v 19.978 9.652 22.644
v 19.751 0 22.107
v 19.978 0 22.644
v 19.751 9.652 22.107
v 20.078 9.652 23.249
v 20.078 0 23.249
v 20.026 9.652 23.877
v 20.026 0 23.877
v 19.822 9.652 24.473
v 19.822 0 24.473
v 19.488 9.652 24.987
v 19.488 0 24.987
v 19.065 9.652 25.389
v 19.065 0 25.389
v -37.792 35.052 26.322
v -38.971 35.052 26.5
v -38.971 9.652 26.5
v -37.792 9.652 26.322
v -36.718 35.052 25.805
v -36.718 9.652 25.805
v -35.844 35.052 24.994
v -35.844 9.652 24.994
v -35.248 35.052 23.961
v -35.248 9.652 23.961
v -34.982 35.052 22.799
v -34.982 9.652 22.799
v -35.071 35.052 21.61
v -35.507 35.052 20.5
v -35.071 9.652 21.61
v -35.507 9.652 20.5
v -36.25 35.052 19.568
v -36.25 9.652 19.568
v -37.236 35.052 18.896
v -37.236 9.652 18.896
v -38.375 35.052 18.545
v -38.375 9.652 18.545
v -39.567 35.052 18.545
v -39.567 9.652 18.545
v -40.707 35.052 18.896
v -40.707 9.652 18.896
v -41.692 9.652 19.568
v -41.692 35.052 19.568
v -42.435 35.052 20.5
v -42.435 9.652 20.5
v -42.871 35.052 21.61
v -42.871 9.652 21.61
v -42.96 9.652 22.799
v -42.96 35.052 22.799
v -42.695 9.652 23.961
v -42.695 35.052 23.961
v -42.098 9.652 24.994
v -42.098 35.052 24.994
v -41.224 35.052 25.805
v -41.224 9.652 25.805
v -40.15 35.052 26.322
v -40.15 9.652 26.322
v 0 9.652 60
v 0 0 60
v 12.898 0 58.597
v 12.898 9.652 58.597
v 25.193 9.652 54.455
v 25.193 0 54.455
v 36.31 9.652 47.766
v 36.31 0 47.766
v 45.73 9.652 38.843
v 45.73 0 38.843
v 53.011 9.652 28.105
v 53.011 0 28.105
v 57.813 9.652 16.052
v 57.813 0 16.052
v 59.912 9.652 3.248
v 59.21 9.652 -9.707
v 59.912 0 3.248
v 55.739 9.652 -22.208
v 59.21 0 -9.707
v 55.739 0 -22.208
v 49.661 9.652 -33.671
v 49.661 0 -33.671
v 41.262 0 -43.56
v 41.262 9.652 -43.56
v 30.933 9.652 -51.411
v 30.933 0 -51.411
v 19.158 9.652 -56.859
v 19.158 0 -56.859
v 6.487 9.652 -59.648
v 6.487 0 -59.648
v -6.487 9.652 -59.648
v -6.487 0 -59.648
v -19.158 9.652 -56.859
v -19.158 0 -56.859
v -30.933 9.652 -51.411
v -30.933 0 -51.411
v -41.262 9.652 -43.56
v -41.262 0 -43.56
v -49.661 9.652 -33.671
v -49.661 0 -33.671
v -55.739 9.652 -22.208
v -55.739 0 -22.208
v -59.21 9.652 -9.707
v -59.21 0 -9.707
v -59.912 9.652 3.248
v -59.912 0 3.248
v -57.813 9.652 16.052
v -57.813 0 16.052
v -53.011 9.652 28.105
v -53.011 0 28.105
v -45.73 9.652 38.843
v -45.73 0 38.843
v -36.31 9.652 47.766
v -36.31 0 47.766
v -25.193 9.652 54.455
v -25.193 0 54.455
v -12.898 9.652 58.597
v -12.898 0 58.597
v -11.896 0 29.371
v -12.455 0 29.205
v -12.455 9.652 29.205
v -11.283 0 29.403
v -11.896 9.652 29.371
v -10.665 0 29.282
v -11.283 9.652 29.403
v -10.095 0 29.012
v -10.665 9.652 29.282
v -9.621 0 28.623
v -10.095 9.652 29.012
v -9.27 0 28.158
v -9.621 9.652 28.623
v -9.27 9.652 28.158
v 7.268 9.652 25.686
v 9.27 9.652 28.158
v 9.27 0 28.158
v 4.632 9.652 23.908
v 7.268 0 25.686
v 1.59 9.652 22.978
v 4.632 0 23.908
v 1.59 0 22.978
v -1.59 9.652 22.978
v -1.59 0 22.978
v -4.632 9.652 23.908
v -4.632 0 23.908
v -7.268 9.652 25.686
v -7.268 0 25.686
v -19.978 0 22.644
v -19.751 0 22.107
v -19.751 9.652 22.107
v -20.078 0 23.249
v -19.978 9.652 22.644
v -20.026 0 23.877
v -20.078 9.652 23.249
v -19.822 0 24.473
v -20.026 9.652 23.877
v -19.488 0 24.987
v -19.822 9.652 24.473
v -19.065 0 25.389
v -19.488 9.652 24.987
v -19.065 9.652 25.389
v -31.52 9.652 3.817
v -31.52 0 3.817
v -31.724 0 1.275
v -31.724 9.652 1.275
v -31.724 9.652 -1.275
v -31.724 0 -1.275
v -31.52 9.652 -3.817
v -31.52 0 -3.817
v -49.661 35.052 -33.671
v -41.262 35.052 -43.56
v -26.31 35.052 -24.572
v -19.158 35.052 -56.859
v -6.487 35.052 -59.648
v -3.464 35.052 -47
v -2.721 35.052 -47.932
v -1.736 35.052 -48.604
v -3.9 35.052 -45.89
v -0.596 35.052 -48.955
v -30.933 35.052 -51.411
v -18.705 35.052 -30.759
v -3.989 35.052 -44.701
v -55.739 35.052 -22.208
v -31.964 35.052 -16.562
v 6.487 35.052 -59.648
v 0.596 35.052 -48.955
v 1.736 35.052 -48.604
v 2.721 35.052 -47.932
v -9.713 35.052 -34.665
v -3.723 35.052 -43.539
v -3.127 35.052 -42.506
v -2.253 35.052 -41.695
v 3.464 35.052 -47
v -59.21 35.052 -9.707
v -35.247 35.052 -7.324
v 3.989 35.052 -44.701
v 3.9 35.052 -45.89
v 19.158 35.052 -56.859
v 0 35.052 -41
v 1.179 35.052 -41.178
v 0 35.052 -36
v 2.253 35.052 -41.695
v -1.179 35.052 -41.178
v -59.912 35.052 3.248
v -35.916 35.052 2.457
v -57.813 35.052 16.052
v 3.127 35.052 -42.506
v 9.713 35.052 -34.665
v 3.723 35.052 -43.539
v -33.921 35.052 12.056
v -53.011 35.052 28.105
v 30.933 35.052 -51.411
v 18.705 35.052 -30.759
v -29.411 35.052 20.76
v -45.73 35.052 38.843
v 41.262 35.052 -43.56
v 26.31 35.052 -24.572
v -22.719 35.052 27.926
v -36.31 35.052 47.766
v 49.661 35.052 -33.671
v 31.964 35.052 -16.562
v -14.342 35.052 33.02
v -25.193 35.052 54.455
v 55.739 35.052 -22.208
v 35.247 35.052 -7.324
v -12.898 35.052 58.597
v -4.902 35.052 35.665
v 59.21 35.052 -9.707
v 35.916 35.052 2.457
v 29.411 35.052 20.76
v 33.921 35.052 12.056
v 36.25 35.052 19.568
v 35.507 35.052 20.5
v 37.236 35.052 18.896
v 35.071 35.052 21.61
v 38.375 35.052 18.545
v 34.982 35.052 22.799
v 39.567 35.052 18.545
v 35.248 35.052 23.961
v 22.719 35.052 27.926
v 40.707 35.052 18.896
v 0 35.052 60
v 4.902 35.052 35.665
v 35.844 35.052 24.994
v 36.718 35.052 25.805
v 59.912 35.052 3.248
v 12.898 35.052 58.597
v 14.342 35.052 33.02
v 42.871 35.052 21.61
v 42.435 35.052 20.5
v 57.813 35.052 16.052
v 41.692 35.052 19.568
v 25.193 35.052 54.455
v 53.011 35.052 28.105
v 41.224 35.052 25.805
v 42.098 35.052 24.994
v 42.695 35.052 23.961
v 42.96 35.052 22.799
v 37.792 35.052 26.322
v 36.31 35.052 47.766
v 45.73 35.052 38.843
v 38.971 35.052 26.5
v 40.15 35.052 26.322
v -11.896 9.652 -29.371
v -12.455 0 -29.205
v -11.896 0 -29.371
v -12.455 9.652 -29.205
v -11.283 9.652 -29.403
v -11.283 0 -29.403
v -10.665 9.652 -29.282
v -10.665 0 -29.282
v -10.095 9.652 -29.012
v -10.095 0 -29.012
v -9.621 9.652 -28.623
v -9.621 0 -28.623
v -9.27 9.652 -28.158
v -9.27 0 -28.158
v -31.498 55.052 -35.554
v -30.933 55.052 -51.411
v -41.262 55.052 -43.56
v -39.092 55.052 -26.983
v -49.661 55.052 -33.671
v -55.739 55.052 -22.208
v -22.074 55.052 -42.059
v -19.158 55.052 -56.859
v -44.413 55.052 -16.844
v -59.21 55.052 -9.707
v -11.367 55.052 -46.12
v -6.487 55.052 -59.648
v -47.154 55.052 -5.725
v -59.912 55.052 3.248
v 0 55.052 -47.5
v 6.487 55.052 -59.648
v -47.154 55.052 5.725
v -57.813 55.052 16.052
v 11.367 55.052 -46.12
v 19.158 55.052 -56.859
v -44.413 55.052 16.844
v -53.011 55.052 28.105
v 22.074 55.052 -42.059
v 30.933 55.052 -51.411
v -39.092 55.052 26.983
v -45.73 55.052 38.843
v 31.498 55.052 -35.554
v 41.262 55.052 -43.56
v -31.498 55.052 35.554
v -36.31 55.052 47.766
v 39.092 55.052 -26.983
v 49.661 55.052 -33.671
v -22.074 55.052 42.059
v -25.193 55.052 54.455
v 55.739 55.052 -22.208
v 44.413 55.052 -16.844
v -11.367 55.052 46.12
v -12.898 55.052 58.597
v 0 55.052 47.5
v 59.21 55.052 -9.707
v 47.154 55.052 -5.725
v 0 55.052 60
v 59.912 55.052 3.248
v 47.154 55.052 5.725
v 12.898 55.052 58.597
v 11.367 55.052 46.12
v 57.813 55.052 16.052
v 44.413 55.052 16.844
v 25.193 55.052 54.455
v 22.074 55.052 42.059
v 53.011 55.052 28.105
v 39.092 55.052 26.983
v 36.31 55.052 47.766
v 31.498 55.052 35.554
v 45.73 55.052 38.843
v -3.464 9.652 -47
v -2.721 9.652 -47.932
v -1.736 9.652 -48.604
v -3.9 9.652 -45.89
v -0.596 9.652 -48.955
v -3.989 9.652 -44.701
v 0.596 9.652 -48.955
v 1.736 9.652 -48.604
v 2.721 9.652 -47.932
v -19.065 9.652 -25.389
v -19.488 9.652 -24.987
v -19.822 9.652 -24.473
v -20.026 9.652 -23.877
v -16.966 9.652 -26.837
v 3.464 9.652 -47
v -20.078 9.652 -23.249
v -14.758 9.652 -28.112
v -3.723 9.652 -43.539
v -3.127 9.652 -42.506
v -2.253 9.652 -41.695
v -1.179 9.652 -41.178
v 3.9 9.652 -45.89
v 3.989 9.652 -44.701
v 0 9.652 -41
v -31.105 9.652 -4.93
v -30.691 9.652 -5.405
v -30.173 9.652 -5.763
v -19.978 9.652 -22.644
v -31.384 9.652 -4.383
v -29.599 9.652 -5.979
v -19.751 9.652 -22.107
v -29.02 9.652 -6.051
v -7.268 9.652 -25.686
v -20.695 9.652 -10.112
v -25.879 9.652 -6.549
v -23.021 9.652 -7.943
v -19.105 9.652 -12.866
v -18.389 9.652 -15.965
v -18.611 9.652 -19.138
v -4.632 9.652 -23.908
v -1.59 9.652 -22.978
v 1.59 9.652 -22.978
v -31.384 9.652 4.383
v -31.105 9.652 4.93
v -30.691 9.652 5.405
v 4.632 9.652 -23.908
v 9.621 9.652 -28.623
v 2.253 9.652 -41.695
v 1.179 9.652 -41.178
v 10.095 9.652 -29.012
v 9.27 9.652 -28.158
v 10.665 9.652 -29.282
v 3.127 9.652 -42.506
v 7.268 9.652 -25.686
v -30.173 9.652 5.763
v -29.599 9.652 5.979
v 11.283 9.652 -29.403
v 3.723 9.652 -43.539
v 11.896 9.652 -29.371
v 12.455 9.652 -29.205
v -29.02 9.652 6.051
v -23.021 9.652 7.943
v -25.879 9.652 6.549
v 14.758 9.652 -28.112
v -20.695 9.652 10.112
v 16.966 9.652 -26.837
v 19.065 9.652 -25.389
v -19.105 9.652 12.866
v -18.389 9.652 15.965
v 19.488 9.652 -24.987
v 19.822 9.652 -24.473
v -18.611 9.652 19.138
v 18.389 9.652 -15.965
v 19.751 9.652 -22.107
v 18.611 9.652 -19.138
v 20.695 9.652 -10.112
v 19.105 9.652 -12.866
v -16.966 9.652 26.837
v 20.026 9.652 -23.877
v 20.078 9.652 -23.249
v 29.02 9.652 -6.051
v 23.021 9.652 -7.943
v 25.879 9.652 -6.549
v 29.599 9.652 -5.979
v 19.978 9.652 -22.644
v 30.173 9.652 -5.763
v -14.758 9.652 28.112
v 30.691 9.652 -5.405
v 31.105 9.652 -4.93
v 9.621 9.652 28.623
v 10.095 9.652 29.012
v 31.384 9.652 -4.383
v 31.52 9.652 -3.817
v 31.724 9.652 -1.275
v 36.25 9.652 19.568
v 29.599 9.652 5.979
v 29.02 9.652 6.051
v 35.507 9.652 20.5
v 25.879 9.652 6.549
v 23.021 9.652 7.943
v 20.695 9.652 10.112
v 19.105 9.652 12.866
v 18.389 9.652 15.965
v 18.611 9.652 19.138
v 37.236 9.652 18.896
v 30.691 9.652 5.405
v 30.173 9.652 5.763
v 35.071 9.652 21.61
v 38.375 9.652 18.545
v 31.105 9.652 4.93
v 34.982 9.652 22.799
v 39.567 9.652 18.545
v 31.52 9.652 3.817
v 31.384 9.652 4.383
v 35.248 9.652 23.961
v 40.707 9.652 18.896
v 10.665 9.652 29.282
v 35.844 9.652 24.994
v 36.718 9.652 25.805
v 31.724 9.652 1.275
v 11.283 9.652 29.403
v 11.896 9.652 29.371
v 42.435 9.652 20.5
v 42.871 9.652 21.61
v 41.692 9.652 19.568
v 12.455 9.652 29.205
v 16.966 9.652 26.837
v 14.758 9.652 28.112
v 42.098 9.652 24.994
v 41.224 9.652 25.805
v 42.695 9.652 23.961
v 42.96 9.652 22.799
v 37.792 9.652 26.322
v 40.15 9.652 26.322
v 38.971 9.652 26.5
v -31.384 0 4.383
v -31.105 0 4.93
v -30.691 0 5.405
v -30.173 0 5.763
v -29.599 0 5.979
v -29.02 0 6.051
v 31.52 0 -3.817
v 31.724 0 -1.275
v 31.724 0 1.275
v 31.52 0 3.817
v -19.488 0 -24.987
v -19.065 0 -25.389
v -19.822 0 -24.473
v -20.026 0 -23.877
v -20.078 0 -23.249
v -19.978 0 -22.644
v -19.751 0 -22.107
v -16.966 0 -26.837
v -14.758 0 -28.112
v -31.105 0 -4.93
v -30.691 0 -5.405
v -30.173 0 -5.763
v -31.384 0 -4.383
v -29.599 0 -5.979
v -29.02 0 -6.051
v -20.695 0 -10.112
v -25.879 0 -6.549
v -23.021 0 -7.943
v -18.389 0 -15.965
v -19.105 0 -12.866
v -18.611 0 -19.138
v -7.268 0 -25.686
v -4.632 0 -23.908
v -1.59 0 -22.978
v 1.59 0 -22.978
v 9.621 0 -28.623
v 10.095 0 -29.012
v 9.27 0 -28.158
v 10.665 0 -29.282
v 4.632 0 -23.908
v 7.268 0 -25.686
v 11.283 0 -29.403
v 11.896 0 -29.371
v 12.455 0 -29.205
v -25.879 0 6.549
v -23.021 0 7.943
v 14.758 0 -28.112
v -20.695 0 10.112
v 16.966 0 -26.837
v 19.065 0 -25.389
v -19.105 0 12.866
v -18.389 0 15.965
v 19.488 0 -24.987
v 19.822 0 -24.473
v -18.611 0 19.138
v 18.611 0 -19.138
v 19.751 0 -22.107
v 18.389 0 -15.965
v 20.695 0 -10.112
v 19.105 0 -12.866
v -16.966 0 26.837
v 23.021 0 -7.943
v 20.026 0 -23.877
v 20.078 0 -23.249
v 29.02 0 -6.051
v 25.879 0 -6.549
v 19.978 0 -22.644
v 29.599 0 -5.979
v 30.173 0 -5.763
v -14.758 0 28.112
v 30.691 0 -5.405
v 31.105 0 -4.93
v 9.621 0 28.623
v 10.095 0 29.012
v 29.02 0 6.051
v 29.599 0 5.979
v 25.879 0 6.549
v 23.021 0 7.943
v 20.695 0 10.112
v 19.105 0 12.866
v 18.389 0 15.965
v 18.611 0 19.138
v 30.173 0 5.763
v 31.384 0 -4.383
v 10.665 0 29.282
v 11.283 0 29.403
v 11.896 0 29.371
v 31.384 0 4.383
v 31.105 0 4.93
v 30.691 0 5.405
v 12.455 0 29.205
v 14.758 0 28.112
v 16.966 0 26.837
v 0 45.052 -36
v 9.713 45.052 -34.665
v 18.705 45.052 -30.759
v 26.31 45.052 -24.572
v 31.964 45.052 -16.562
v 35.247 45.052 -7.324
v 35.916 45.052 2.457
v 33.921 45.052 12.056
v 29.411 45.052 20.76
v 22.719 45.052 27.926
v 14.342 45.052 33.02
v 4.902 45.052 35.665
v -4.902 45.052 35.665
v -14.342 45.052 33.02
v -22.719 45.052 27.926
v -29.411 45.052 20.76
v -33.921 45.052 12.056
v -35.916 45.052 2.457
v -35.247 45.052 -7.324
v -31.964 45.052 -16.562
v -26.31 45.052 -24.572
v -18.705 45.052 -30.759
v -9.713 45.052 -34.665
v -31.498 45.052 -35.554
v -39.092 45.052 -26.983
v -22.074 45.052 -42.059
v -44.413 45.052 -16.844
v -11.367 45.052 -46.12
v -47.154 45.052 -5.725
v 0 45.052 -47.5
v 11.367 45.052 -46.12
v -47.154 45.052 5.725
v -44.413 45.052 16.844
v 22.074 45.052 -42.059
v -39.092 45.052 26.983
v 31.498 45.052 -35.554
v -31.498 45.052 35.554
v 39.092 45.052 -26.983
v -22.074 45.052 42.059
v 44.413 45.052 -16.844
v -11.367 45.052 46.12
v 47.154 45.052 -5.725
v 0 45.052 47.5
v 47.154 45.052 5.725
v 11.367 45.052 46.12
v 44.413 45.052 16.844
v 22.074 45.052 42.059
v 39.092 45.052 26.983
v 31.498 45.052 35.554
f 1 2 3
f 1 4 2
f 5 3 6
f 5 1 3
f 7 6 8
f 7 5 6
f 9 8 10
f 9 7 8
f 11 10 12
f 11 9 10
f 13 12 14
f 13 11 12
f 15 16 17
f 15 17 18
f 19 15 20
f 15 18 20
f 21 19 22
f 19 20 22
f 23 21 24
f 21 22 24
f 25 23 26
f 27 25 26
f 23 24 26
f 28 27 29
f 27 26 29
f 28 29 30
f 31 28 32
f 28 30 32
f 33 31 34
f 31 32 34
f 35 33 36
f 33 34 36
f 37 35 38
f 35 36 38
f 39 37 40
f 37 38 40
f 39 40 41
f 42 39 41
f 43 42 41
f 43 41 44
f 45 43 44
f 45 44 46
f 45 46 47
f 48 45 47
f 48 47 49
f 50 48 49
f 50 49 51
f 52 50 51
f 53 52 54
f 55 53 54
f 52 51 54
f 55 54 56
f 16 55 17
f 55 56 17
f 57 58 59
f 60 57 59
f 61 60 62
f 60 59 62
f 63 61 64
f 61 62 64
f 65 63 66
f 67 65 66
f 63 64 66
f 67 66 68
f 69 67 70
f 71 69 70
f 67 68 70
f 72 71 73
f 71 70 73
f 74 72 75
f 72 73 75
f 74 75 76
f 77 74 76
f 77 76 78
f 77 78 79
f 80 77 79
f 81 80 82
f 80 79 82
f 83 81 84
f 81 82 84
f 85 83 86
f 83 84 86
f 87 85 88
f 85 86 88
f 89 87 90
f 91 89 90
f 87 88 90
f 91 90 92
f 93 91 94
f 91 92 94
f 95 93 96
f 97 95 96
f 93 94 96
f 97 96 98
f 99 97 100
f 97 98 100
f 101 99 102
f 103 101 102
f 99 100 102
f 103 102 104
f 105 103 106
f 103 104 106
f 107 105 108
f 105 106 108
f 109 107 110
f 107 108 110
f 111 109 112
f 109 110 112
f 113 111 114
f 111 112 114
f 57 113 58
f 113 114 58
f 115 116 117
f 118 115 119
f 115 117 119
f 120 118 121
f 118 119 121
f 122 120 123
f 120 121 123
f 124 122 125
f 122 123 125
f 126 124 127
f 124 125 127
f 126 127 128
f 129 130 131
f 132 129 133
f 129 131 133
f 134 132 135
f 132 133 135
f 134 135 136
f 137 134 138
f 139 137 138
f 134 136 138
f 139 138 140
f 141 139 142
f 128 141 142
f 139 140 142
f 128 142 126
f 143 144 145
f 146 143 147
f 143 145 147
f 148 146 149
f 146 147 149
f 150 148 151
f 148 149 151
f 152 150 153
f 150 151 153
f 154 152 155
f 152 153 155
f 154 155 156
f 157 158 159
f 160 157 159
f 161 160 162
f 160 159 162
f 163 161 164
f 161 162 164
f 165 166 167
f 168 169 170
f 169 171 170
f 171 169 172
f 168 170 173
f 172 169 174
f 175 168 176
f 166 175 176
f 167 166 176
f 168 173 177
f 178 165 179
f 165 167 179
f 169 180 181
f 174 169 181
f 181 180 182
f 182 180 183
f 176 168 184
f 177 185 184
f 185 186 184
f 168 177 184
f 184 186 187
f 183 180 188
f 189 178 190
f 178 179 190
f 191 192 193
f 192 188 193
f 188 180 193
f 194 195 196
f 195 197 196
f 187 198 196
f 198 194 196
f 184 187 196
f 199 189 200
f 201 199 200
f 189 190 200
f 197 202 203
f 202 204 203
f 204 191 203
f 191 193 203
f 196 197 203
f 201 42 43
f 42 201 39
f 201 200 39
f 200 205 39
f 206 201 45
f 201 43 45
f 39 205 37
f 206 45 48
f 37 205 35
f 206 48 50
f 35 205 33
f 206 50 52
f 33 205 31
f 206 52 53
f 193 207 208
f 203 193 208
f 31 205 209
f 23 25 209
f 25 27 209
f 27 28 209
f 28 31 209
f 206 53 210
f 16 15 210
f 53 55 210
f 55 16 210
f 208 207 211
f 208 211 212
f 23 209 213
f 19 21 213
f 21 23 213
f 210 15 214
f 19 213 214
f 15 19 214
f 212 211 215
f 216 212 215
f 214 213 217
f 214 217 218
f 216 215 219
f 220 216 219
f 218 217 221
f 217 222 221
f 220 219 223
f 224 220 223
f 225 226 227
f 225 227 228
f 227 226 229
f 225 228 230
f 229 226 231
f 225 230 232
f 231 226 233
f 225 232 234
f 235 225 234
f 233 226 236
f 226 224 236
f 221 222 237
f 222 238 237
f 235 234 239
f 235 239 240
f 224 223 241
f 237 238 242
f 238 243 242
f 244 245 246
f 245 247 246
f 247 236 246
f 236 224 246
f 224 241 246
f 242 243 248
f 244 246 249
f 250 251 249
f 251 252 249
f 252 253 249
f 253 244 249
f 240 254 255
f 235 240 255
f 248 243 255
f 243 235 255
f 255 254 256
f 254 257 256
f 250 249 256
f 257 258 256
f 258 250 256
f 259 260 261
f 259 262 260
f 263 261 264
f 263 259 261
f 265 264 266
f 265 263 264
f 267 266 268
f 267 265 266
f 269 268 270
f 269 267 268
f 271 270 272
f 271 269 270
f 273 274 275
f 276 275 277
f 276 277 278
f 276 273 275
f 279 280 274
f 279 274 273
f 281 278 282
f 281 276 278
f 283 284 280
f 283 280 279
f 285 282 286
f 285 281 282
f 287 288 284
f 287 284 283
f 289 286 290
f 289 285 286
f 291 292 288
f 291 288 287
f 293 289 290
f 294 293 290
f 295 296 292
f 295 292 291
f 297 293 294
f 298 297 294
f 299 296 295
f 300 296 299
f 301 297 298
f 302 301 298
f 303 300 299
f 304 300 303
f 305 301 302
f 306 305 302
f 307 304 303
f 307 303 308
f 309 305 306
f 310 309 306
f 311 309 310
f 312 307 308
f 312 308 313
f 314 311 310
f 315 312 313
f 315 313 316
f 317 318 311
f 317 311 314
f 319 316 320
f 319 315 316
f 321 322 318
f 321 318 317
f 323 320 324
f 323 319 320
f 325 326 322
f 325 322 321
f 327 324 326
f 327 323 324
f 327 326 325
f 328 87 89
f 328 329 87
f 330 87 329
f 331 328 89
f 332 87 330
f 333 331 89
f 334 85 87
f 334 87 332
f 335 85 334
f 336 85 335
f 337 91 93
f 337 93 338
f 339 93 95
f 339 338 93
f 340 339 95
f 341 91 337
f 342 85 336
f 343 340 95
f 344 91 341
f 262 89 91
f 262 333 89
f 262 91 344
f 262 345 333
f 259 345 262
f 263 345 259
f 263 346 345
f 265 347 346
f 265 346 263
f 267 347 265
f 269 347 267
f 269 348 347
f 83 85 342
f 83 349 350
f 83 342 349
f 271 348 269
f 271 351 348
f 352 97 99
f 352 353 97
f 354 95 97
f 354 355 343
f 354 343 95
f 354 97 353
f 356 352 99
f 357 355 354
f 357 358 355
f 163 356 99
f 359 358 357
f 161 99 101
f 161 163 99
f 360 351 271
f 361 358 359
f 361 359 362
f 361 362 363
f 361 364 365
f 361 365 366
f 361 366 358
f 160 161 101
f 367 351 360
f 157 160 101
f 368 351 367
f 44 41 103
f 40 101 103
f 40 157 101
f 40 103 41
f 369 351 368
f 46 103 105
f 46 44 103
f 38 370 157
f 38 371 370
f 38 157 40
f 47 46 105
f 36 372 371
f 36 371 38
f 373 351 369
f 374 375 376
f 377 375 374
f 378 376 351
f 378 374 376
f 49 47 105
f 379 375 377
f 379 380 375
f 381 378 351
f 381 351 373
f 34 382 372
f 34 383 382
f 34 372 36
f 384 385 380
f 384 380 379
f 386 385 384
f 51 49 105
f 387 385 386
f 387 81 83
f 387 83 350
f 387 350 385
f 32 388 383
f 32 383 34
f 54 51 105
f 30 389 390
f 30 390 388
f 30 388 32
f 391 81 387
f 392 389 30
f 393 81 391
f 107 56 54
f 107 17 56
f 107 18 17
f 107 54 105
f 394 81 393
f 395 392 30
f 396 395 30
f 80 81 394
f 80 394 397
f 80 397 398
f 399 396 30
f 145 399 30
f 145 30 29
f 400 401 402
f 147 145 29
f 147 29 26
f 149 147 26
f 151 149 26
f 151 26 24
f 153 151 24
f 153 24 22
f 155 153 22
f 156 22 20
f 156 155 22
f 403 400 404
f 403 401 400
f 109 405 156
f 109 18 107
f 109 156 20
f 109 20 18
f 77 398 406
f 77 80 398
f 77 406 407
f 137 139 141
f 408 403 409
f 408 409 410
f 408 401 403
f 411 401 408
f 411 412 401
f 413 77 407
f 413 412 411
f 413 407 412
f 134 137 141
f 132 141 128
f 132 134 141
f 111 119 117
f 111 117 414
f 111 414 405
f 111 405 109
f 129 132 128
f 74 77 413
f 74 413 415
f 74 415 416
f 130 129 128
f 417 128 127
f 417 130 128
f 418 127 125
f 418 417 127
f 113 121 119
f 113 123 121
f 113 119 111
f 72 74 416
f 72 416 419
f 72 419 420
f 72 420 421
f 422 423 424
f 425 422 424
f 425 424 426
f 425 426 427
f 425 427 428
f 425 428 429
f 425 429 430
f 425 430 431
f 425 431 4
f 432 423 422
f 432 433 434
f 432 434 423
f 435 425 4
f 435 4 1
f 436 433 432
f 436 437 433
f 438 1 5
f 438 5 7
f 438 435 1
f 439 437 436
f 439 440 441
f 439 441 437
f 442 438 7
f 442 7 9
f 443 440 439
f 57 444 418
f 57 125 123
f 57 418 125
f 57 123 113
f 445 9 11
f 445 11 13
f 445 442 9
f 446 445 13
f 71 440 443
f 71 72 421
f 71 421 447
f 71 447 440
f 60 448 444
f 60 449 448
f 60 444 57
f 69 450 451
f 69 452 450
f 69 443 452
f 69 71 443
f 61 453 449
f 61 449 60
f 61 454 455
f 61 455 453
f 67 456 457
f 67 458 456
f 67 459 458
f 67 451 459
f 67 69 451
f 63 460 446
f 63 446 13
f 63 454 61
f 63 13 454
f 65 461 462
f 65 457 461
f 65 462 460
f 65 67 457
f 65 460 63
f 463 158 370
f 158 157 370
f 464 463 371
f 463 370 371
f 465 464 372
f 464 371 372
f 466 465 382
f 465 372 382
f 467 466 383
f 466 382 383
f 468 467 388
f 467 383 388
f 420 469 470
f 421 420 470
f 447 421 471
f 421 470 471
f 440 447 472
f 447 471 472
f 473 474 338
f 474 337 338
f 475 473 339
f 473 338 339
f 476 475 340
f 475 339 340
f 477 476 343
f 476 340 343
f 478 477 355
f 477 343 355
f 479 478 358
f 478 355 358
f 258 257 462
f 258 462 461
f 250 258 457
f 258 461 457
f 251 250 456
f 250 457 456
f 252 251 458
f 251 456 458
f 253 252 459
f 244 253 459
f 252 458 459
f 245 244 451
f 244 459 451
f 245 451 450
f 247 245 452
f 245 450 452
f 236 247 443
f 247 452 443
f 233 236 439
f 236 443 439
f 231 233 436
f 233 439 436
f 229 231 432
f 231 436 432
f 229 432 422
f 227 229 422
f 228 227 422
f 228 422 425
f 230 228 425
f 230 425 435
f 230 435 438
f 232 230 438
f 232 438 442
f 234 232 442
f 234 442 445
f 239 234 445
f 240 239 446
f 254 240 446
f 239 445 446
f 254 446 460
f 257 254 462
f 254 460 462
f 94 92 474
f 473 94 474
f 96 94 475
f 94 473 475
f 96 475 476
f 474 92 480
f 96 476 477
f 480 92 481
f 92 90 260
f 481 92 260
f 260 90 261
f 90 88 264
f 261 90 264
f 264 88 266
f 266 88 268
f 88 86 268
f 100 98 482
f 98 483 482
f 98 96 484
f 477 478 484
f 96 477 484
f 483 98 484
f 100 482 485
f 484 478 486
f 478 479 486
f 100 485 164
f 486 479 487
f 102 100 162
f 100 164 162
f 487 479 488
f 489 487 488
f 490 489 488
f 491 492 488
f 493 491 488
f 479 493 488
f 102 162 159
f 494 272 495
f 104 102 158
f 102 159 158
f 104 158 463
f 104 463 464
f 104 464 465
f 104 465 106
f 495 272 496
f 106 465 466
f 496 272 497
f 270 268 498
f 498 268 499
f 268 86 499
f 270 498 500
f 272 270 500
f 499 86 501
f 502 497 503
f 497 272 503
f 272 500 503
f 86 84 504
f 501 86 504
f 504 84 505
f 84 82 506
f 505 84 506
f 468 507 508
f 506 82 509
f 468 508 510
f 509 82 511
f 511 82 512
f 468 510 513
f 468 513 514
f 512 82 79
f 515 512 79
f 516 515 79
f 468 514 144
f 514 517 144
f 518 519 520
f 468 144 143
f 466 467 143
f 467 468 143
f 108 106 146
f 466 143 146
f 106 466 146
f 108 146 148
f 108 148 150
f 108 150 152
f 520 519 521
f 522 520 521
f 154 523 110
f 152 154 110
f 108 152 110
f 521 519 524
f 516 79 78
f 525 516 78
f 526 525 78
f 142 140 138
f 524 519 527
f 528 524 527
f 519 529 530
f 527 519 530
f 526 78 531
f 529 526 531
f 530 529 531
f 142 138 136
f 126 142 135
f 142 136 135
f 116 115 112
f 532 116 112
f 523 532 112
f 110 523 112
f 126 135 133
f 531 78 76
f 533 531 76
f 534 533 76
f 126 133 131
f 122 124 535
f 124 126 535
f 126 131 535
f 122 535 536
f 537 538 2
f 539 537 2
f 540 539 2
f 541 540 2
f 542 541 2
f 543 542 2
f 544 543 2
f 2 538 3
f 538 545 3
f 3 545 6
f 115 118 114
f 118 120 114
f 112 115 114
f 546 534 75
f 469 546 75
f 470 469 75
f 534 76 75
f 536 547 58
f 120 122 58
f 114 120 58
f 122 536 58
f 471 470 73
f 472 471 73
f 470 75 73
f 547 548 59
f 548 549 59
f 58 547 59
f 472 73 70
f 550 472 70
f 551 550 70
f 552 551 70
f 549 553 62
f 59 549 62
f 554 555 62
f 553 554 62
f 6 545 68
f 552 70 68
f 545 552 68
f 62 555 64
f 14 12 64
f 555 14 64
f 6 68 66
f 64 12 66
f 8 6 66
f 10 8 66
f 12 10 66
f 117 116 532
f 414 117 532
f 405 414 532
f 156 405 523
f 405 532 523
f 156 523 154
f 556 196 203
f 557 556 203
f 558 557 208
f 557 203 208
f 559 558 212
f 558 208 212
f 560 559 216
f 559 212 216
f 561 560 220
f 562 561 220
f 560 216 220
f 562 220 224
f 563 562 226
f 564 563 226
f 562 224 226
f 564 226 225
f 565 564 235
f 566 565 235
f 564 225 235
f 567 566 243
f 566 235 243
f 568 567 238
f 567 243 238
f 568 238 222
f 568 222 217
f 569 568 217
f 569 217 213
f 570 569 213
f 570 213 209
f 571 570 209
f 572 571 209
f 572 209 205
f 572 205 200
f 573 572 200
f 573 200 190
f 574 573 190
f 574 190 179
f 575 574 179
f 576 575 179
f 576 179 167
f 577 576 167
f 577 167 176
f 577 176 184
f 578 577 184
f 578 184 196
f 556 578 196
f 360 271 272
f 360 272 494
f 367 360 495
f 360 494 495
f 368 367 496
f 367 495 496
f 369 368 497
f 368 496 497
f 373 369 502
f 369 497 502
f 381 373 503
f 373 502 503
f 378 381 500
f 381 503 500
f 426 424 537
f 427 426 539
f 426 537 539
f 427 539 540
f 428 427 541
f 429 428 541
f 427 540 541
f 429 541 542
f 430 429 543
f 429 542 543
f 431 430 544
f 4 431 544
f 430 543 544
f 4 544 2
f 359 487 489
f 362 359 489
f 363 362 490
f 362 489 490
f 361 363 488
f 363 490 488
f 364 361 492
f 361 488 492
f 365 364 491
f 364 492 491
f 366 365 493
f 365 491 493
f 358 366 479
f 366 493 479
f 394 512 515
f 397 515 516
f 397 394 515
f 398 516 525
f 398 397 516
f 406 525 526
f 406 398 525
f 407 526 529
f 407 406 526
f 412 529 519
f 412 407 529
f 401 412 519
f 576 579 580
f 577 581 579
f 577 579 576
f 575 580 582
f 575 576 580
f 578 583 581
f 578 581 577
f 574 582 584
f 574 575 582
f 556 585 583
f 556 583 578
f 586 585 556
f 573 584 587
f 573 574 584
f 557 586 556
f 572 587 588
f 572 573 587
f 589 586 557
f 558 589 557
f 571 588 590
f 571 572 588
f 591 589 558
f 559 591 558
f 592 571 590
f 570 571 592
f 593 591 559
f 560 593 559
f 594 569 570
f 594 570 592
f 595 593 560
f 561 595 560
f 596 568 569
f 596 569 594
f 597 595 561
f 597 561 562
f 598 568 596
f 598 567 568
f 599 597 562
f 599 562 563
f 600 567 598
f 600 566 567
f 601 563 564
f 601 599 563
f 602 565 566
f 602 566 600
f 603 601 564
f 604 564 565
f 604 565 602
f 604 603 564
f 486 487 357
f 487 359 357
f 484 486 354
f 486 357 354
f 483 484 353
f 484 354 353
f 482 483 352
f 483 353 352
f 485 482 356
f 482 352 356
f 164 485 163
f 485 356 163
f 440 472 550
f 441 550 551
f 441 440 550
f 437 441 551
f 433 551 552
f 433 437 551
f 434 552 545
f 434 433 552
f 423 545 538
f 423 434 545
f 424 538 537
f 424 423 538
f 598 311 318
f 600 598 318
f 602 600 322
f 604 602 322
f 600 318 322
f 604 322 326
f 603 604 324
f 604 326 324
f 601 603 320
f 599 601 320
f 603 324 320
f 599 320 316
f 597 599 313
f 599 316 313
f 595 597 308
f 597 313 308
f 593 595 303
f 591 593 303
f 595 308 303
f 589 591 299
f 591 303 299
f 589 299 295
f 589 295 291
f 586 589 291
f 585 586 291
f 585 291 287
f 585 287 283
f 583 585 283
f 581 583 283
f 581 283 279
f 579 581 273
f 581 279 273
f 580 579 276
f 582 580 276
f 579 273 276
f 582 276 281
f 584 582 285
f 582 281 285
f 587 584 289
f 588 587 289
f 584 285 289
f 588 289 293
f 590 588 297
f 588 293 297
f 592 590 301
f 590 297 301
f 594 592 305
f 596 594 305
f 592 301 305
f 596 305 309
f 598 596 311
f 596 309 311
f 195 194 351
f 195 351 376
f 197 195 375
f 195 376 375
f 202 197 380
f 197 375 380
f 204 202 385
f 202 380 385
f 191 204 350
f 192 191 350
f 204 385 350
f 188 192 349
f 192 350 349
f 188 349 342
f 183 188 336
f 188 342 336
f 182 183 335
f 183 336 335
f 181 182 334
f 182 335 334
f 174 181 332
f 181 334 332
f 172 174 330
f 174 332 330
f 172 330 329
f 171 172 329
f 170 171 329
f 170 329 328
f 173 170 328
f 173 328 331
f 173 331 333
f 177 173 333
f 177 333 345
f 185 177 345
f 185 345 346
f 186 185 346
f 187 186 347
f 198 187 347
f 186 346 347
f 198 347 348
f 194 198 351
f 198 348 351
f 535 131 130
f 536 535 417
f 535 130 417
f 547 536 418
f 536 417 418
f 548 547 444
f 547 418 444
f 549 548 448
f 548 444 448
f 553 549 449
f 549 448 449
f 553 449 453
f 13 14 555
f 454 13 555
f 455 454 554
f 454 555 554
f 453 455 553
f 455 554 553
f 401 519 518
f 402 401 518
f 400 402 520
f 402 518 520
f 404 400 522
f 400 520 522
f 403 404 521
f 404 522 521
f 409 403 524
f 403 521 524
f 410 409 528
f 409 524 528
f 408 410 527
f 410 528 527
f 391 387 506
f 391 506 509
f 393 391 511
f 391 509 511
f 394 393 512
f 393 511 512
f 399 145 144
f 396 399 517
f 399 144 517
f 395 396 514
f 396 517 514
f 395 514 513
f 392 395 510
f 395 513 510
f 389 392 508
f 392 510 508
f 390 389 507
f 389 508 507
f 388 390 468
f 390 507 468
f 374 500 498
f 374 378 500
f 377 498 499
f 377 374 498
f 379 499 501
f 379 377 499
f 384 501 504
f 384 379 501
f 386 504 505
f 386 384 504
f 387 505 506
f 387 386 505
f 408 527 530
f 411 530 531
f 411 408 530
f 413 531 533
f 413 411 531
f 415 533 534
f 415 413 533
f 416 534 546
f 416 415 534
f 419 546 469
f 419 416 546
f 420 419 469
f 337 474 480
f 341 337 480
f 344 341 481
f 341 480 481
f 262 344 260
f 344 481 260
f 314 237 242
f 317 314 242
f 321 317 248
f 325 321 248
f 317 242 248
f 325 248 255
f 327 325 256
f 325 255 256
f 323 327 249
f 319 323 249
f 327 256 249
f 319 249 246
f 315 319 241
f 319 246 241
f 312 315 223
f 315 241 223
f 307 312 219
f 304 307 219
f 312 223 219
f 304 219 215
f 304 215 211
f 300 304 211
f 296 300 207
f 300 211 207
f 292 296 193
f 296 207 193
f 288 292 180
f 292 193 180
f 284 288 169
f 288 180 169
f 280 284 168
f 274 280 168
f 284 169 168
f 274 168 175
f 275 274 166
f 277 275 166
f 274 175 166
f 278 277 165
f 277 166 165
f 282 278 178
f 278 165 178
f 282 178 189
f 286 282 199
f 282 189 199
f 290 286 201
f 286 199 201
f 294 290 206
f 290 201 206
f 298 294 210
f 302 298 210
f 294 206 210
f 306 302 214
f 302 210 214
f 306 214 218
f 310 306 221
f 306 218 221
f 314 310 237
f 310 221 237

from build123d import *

# Parameters (mm, degrees)
SKETCH1_R           = 60
BOSS_EXTRUDE1_DEPTH = 9.652
SKETCH2_R           = 4
BOSS_EXTRUDE2_DEPTH = 25.4
SKETCH3_R           = 60
BOSS_EXTRUDE3_DEPTH = 20
SKETCH5_R           = 36
CUT_EXTRUDE1_DEPTH  = 92.807639682
SKETCH6_R           = 47.5
CUT_EXTRUDE2_DEPTH  = 10
FILLET1_R           = 2.54


with BuildPart() as part:
    # Sketch1 → Boss-Extrude1 (new body)
    with BuildSketch(Plane(origin=(0, 0, 0), x_dir=(1, 0, 0), z_dir=(0, 1, 0))):
        with Locations(Location((0, 0, 0), (0, 0, 270))):
            Circle(SKETCH1_R)
        with BuildLine():
            ThreePointArc((-10.16, 30.080506977), (0, 22.86), (10.16, 30.080506977))
            ThreePointArc((10.16, 30.080506977), (15.875, 27.49630657), (20.970483201, 23.839071591))
            ThreePointArc((20.970483201, 23.839071591), (19.797340731, 11.43), (31.130483201, 6.241435386))
            ThreePointArc((31.130483201, 6.241435386), (31.75, 0), (31.130483201, -6.241435386))
            ThreePointArc((31.130483201, -6.241435386), (19.797340731, -11.43), (20.970483201, -23.839071591))
            ThreePointArc((20.970483201, -23.839071591), (15.875, -27.49630657), (10.16, -30.080506977))
            ThreePointArc((10.16, -30.080506977), (0, -22.86), (-10.16, -30.080506977))
            ThreePointArc((-10.16, -30.080506977), (-15.875, -27.49630657), (-20.970483201, -23.839071591))
            ThreePointArc((-20.970483201, -23.839071591), (-19.797340731, -11.43), (-31.130483201, -6.241435386))
            ThreePointArc((-31.130483201, -6.241435386), (-31.75, 0), (-31.130483201, 6.241435386))
            ThreePointArc((-31.130483201, 6.241435386), (-19.797340731, 11.43), (-20.970483201, 23.839071591))
            ThreePointArc((-20.970483201, 23.839071591), (-15.875, 27.49630657), (-10.16, 30.080506977))
        make_face(mode=Mode.SUBTRACT)
    extrude(amount=BOSS_EXTRUDE1_DEPTH)

    # Sketch2 → Boss-Extrude2 (add)
    with BuildSketch(Plane(origin=(0, 9.652, 0), x_dir=(1, 0, 0), z_dir=(0, 1, 0))):
        with Locations(Location((0, 45, 0), (0, 0, 270))):
            Circle(SKETCH2_R)
        with Locations(Location((38.97114317, -22.5, 0), (0, 0, 270))):
            Circle(SKETCH2_R)
        with Locations(Location((-38.97114317, -22.5, 0), (0, 0, 270))):
            Circle(SKETCH2_R)
    extrude(amount=BOSS_EXTRUDE2_DEPTH)

    # Sketch3 → Boss-Extrude3 (add)
    with BuildSketch(Plane(origin=(0, 35.052, 0), x_dir=(1, 0, 0), z_dir=(0, 1, 0))):
        with Locations(Location((0, 0, 0), (0, 0, 270))):
            Circle(SKETCH3_R)
    extrude(amount=BOSS_EXTRUDE3_DEPTH)

    # Sketch5 → Cut-Extrude1 (cut, through all)
    with BuildSketch(Plane.XZ.offset(-35.052)):
        with Locations(Location((0, 0, 0), (0, 0, 270))):
            Circle(SKETCH5_R)
    extrude(amount=-CUT_EXTRUDE1_DEPTH, mode=Mode.SUBTRACT)

    # Sketch6 → Cut-Extrude2 (cut)
    with BuildSketch(Plane(origin=(0, 55.052, 0), x_dir=(1, 0, 0), z_dir=(0, 1, 0))):
        with Locations(Location((0, 0, 0), (0, 0, 270))):
            Circle(SKETCH6_R)
    extrude(amount=-CUT_EXTRUDE2_DEPTH, mode=Mode.SUBTRACT)

    # Fillet1
    fillet1_edges = [part.edges().sort_by_distance(p)[0] for p in [
        (-10.16, 4.826, 30.080506977),
        (10.16, 4.826, 30.080506977),
        (20.970483201, 4.826, 23.839071591),
        (31.130483201, 4.826, 6.241435386),
        (31.130483201, 4.826, -6.241435386),
        (20.970483201, 4.826, -23.839071591),
        (10.16, 4.826, -30.080506977),
        (-10.16, 4.826, -30.080506977),
        (-20.970483201, 4.826, -23.839071591),
        (-31.130483201, 4.826, -6.241435386),
        (-31.130483201, 4.826, 6.241435386),
        (-20.970483201, 4.826, 23.839071591),
    ]]
    fillet(fillet1_edges, radius=FILLET1_R)


solid = part.part
